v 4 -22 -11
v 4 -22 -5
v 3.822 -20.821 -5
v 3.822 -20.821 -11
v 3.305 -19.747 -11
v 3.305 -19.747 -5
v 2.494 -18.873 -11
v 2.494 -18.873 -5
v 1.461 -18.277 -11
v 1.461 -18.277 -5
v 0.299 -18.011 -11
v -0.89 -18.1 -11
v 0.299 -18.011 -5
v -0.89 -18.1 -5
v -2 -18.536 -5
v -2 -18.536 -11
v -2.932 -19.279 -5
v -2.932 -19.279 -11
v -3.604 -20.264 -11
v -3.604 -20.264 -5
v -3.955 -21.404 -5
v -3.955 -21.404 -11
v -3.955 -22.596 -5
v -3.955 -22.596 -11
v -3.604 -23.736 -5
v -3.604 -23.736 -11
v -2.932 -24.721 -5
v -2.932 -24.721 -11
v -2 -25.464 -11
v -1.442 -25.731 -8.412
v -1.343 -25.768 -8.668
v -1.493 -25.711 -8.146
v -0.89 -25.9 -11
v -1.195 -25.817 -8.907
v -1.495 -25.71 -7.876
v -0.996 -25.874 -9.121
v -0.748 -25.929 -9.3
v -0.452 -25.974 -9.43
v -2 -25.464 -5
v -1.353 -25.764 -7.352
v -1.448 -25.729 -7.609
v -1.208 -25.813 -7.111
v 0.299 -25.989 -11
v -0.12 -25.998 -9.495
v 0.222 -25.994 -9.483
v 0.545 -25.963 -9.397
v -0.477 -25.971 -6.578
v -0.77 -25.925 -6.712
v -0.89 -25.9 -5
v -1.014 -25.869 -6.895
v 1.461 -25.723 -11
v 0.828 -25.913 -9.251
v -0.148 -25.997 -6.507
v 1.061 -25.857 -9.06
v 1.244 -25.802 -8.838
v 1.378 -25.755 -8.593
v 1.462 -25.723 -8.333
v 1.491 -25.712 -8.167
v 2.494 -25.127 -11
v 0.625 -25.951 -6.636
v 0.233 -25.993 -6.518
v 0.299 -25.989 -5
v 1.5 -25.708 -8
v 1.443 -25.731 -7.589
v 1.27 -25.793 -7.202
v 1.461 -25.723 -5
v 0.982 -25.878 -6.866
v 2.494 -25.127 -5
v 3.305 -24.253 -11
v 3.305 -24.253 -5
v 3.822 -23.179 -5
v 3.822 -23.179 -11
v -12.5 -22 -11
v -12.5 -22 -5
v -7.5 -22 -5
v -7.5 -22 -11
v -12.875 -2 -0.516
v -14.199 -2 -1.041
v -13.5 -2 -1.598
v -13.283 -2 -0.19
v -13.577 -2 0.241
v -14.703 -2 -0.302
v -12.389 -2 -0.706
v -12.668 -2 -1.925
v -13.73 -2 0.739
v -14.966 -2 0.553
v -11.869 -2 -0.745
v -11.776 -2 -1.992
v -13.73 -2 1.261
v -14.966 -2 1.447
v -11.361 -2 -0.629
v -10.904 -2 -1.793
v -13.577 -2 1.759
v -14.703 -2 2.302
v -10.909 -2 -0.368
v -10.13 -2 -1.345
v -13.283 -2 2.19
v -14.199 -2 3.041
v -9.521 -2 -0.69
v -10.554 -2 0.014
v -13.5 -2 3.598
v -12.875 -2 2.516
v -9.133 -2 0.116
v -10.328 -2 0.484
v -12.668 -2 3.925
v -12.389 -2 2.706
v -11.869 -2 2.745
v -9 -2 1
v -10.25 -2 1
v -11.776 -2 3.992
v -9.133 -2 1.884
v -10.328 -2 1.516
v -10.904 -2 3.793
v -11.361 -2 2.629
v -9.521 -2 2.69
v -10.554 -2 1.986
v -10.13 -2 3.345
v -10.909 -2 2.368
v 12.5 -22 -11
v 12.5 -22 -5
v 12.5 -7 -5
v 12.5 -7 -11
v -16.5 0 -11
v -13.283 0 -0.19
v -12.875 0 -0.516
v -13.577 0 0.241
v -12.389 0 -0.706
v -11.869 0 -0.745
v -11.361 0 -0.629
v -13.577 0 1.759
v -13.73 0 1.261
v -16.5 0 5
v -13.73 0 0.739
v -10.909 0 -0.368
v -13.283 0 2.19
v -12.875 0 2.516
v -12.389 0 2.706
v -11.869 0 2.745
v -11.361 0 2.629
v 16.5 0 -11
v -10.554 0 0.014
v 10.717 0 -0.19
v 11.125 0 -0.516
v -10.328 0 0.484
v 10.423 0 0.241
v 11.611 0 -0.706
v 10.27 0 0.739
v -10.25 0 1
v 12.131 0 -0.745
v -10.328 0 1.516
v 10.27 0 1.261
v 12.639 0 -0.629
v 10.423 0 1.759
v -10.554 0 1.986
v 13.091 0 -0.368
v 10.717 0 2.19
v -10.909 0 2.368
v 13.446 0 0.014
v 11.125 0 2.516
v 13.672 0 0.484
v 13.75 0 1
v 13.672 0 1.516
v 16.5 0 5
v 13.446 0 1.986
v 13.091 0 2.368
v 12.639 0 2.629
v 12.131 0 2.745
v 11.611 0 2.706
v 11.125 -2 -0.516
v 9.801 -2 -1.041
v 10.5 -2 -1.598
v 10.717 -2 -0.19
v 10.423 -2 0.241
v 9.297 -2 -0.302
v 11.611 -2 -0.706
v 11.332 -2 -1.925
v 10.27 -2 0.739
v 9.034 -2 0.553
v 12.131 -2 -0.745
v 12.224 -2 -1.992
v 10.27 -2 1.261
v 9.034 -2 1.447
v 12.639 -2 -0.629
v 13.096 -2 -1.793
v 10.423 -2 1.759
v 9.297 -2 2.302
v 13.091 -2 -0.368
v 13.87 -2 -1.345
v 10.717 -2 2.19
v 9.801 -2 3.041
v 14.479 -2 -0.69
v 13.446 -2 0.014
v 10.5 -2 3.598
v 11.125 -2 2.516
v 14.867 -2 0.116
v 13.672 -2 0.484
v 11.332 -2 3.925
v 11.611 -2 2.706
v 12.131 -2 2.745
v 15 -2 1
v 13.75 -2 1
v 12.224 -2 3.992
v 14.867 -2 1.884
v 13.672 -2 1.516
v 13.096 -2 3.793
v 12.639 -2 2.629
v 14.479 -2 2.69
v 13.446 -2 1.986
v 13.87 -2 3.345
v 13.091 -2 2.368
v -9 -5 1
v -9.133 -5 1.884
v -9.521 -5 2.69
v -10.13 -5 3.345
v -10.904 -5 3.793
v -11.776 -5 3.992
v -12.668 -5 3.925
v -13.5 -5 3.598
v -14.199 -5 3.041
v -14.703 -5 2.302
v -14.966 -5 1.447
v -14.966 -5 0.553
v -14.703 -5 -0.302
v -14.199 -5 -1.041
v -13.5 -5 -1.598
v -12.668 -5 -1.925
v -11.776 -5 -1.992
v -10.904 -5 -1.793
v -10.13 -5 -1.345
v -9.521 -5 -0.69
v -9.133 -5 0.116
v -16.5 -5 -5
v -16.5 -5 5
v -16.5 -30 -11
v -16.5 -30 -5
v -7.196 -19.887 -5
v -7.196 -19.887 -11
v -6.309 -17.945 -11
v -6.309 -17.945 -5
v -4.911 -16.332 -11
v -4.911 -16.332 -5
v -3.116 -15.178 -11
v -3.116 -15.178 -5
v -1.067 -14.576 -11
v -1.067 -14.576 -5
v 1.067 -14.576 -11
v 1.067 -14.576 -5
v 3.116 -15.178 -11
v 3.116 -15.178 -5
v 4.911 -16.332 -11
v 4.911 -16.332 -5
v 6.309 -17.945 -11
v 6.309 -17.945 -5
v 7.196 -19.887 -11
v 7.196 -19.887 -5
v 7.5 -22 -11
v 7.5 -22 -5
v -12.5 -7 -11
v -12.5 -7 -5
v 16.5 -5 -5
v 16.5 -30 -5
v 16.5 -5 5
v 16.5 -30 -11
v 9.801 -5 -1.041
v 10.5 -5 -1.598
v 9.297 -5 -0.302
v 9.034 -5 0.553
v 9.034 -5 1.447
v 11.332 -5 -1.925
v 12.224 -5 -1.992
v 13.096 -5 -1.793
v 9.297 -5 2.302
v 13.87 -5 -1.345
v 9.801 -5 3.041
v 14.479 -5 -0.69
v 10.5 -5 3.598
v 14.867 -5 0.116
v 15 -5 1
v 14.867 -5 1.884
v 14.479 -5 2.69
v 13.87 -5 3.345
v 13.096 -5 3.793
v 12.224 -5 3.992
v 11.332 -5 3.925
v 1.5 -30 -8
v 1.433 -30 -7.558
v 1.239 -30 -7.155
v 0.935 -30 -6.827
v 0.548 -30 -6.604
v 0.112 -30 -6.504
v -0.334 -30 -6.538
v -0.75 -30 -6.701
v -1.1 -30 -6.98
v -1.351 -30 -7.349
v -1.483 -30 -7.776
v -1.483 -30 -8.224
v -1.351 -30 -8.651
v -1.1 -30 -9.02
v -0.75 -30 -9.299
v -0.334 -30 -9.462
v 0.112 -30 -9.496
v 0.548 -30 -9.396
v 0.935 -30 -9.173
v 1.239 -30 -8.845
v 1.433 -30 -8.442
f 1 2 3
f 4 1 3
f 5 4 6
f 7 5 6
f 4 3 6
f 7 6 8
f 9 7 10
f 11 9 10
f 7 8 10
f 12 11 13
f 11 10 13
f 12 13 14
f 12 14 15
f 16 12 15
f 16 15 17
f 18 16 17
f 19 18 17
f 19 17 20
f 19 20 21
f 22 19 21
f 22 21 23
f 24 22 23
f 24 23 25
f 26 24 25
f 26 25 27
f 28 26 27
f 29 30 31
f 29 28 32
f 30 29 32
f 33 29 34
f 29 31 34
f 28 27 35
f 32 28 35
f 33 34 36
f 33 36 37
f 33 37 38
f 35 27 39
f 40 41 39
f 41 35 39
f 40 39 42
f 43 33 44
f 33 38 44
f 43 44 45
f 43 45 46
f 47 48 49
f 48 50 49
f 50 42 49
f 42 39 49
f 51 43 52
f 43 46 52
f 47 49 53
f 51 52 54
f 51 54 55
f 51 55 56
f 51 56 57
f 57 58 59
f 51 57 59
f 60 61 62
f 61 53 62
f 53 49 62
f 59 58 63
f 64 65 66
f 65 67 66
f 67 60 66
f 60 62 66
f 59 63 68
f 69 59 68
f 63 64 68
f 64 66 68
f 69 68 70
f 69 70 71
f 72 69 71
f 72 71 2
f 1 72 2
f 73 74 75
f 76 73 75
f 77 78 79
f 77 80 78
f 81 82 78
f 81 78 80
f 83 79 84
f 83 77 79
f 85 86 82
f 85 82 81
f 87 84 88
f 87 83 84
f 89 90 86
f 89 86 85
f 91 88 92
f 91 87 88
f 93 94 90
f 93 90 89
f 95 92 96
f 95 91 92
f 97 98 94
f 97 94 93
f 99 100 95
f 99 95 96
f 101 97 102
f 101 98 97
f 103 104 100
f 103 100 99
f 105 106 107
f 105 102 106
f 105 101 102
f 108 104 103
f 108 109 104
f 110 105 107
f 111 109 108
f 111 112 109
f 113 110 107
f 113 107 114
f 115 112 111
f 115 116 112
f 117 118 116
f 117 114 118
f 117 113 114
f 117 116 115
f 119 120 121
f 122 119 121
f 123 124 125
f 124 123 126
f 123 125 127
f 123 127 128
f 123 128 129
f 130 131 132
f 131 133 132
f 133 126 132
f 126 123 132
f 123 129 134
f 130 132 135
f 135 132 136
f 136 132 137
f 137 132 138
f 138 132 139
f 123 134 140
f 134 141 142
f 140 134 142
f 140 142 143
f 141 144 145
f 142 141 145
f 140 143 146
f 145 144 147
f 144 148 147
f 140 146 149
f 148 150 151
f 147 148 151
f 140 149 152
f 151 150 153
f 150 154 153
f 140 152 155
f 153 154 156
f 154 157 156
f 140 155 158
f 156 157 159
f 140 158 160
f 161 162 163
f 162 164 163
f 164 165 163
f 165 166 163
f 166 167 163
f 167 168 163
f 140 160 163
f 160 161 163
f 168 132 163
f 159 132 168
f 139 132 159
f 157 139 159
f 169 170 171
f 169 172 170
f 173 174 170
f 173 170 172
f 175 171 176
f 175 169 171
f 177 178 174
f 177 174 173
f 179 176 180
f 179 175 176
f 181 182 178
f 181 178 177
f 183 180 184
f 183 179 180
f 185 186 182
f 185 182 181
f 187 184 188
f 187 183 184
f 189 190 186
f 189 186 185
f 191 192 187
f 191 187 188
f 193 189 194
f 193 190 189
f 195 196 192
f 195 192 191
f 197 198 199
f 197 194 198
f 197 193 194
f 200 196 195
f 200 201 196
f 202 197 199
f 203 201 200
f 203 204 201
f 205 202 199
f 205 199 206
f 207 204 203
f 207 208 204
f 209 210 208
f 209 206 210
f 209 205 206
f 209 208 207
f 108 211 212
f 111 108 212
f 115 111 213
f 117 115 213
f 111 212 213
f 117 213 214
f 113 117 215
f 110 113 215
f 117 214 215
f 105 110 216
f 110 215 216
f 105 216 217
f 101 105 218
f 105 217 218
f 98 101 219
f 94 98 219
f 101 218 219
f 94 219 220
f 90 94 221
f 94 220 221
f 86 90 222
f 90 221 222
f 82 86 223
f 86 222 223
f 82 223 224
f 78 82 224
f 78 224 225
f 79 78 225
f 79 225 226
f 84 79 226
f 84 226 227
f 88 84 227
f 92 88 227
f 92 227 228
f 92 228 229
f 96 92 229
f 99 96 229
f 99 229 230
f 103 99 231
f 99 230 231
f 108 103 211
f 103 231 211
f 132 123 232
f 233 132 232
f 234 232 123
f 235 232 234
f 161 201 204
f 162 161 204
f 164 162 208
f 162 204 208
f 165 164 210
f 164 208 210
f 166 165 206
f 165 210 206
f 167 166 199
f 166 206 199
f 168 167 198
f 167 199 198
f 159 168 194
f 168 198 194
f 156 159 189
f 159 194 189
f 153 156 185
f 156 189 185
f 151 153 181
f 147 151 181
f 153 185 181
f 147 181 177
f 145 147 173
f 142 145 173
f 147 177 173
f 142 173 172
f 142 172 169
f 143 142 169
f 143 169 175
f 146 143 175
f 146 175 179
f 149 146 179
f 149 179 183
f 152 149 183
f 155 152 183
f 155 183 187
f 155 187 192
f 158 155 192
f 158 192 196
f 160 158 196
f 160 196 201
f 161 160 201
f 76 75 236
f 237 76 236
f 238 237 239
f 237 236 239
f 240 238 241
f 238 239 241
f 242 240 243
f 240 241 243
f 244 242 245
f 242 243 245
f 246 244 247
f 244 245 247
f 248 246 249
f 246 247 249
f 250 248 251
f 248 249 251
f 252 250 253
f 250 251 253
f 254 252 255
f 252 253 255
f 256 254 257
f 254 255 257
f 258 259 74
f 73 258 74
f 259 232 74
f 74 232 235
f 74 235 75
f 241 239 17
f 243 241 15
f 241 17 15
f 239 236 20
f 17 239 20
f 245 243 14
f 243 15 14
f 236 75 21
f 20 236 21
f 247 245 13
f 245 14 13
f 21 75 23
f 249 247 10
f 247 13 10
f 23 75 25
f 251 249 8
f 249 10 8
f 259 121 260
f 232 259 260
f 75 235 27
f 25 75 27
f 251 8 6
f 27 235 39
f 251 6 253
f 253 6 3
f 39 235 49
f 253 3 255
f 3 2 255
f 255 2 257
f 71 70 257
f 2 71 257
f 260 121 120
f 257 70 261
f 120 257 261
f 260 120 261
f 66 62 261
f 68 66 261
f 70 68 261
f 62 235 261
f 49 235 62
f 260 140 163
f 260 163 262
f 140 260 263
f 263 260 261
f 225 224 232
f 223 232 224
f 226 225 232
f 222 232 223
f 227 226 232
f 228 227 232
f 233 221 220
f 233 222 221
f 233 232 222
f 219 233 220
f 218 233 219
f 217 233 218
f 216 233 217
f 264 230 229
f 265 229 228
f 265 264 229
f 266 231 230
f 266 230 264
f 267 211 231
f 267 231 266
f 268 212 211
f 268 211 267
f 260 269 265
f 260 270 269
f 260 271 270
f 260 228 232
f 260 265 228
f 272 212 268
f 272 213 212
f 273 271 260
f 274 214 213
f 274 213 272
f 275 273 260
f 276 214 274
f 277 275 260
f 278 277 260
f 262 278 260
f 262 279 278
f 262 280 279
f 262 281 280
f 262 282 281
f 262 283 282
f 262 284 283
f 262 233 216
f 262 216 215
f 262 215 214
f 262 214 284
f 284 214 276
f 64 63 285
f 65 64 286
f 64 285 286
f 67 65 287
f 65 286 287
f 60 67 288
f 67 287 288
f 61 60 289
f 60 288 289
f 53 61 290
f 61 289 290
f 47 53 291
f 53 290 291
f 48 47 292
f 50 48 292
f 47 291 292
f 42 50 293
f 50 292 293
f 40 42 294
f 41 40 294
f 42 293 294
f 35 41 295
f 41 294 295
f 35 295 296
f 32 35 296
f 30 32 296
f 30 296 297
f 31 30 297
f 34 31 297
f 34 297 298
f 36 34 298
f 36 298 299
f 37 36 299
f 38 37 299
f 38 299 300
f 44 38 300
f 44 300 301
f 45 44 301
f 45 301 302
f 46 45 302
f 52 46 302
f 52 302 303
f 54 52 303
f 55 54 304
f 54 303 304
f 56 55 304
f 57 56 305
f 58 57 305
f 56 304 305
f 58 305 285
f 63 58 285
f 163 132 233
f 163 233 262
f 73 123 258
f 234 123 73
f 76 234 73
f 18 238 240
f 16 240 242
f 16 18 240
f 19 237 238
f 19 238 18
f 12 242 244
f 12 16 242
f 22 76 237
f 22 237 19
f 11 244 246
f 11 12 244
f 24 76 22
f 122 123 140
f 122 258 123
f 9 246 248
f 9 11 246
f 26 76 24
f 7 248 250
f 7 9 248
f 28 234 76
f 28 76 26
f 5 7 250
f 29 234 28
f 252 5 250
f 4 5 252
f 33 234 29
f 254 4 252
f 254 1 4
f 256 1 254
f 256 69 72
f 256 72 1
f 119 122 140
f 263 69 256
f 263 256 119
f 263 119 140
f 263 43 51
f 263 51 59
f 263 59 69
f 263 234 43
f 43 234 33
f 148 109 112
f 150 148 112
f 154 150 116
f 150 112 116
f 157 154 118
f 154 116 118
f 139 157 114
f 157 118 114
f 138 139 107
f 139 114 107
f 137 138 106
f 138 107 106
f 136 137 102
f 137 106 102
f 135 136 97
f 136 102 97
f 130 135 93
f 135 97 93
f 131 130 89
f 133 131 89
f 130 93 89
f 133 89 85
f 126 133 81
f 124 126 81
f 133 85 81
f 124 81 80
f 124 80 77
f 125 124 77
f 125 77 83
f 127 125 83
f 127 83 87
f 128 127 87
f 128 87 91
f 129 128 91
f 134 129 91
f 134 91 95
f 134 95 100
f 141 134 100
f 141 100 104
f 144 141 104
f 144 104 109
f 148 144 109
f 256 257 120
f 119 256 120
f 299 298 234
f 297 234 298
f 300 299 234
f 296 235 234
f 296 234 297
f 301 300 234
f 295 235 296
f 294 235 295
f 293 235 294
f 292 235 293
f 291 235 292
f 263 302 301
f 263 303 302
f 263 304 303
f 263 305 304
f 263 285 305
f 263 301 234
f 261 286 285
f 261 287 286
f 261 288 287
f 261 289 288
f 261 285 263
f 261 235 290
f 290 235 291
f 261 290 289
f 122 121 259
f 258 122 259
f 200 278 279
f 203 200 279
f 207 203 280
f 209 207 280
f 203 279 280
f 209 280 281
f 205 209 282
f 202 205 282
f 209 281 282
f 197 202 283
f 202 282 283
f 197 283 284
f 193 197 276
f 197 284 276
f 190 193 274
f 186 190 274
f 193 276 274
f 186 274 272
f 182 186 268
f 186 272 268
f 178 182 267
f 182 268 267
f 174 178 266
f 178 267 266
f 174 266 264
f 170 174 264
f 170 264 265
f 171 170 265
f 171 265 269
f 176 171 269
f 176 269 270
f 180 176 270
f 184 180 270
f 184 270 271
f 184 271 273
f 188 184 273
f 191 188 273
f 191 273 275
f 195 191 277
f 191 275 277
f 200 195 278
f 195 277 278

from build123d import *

# Parameters (mm, degrees)
F0_W      = 33
F0_H      = 10
F1_DEPTH  = 5
F2_R      = 1.75
F3_DEPTH  = 5
F2_R_2    = 3
F4_DEPTH  = 3
F5_W      = 33
F5_H      = 30
F6_DEPTH  = 6
F7_R      = 4
F8_DEPTH  = 6
F9_R      = 1.5
F10_DEPTH = 4.2929008565
F12_DEPTH = 6


with BuildPart() as f1:
    # F0 (on Front) → F1 (new body)
    with BuildSketch(Plane.XZ):
        Rectangle(F0_W, F0_H)
    extrude(amount=F1_DEPTH)

    # F2 (on face) → F3 (cut, through all)
    with BuildSketch(Plane.XZ.offset(5)):
        with Locations((-12, 1)):
            Circle(F2_R)
        with Locations((12, 1)):
            Circle(F2_R)
    extrude(amount=-F3_DEPTH, mode=Mode.SUBTRACT)

    # F2 (on face) → F4 (cut)
    with BuildSketch(Plane.XZ.offset(5)):
        with Locations((-12, 1)):
            Circle(F2_R_2)
        with Locations((-12, 1)):
            Circle(F2_R, mode=Mode.SUBTRACT)
        with Locations((12, 1)):
            Circle(F2_R_2)
        with Locations((12, 1)):
            Circle(F2_R, mode=Mode.SUBTRACT)
    extrude(amount=-F4_DEPTH, mode=Mode.SUBTRACT)

    # F5 (on face) → F6 (join)
    with BuildSketch(Plane(origin=(0, 0, -5), x_dir=(1, 0, 0), z_dir=(0, 0, -1))):
        with Locations((0, 15)):
            Rectangle(F5_W, F5_H)
    extrude(amount=F6_DEPTH)

    # F7 (on face) → F8 (cut, through all)
    with BuildSketch(Plane.XY.offset(-5)):
        with Locations((0, -22)):
            Circle(F7_R)
    extrude(amount=-F8_DEPTH, mode=Mode.SUBTRACT)

    # F9 (on face) → F10 (cut, through all)
    with BuildSketch(Plane.XZ.offset(30)):
        with Locations((0, -8)):
            Circle(F9_R)
    extrude(amount=-F10_DEPTH, mode=Mode.SUBTRACT)

    # F11 (on face) → F12 (cut, through all)
    with BuildSketch(Plane.XY.offset(-5)):
        with BuildLine():
            Line((12.5, -7), (-12.5, -7))
            Line((-12.5, -7), (-12.5, -14.6550831307))
            Line((-12.5, -14.6550831307), (-12.5, -22))
            Line((-12.5, -22), (-7.5, -22))
            ThreePointArc((-7.5, -22), (0, -14.5), (7.5, -22))
            Line((7.5, -22), (12.5, -22))
            Line((12.5, -22), (12.5, -14.6550831307))
            Line((12.5, -14.6550831307), (12.5, -7))
        make_face()
    extrude(amount=-F12_DEPTH, mode=Mode.SUBTRACT)


solid = f1.part
